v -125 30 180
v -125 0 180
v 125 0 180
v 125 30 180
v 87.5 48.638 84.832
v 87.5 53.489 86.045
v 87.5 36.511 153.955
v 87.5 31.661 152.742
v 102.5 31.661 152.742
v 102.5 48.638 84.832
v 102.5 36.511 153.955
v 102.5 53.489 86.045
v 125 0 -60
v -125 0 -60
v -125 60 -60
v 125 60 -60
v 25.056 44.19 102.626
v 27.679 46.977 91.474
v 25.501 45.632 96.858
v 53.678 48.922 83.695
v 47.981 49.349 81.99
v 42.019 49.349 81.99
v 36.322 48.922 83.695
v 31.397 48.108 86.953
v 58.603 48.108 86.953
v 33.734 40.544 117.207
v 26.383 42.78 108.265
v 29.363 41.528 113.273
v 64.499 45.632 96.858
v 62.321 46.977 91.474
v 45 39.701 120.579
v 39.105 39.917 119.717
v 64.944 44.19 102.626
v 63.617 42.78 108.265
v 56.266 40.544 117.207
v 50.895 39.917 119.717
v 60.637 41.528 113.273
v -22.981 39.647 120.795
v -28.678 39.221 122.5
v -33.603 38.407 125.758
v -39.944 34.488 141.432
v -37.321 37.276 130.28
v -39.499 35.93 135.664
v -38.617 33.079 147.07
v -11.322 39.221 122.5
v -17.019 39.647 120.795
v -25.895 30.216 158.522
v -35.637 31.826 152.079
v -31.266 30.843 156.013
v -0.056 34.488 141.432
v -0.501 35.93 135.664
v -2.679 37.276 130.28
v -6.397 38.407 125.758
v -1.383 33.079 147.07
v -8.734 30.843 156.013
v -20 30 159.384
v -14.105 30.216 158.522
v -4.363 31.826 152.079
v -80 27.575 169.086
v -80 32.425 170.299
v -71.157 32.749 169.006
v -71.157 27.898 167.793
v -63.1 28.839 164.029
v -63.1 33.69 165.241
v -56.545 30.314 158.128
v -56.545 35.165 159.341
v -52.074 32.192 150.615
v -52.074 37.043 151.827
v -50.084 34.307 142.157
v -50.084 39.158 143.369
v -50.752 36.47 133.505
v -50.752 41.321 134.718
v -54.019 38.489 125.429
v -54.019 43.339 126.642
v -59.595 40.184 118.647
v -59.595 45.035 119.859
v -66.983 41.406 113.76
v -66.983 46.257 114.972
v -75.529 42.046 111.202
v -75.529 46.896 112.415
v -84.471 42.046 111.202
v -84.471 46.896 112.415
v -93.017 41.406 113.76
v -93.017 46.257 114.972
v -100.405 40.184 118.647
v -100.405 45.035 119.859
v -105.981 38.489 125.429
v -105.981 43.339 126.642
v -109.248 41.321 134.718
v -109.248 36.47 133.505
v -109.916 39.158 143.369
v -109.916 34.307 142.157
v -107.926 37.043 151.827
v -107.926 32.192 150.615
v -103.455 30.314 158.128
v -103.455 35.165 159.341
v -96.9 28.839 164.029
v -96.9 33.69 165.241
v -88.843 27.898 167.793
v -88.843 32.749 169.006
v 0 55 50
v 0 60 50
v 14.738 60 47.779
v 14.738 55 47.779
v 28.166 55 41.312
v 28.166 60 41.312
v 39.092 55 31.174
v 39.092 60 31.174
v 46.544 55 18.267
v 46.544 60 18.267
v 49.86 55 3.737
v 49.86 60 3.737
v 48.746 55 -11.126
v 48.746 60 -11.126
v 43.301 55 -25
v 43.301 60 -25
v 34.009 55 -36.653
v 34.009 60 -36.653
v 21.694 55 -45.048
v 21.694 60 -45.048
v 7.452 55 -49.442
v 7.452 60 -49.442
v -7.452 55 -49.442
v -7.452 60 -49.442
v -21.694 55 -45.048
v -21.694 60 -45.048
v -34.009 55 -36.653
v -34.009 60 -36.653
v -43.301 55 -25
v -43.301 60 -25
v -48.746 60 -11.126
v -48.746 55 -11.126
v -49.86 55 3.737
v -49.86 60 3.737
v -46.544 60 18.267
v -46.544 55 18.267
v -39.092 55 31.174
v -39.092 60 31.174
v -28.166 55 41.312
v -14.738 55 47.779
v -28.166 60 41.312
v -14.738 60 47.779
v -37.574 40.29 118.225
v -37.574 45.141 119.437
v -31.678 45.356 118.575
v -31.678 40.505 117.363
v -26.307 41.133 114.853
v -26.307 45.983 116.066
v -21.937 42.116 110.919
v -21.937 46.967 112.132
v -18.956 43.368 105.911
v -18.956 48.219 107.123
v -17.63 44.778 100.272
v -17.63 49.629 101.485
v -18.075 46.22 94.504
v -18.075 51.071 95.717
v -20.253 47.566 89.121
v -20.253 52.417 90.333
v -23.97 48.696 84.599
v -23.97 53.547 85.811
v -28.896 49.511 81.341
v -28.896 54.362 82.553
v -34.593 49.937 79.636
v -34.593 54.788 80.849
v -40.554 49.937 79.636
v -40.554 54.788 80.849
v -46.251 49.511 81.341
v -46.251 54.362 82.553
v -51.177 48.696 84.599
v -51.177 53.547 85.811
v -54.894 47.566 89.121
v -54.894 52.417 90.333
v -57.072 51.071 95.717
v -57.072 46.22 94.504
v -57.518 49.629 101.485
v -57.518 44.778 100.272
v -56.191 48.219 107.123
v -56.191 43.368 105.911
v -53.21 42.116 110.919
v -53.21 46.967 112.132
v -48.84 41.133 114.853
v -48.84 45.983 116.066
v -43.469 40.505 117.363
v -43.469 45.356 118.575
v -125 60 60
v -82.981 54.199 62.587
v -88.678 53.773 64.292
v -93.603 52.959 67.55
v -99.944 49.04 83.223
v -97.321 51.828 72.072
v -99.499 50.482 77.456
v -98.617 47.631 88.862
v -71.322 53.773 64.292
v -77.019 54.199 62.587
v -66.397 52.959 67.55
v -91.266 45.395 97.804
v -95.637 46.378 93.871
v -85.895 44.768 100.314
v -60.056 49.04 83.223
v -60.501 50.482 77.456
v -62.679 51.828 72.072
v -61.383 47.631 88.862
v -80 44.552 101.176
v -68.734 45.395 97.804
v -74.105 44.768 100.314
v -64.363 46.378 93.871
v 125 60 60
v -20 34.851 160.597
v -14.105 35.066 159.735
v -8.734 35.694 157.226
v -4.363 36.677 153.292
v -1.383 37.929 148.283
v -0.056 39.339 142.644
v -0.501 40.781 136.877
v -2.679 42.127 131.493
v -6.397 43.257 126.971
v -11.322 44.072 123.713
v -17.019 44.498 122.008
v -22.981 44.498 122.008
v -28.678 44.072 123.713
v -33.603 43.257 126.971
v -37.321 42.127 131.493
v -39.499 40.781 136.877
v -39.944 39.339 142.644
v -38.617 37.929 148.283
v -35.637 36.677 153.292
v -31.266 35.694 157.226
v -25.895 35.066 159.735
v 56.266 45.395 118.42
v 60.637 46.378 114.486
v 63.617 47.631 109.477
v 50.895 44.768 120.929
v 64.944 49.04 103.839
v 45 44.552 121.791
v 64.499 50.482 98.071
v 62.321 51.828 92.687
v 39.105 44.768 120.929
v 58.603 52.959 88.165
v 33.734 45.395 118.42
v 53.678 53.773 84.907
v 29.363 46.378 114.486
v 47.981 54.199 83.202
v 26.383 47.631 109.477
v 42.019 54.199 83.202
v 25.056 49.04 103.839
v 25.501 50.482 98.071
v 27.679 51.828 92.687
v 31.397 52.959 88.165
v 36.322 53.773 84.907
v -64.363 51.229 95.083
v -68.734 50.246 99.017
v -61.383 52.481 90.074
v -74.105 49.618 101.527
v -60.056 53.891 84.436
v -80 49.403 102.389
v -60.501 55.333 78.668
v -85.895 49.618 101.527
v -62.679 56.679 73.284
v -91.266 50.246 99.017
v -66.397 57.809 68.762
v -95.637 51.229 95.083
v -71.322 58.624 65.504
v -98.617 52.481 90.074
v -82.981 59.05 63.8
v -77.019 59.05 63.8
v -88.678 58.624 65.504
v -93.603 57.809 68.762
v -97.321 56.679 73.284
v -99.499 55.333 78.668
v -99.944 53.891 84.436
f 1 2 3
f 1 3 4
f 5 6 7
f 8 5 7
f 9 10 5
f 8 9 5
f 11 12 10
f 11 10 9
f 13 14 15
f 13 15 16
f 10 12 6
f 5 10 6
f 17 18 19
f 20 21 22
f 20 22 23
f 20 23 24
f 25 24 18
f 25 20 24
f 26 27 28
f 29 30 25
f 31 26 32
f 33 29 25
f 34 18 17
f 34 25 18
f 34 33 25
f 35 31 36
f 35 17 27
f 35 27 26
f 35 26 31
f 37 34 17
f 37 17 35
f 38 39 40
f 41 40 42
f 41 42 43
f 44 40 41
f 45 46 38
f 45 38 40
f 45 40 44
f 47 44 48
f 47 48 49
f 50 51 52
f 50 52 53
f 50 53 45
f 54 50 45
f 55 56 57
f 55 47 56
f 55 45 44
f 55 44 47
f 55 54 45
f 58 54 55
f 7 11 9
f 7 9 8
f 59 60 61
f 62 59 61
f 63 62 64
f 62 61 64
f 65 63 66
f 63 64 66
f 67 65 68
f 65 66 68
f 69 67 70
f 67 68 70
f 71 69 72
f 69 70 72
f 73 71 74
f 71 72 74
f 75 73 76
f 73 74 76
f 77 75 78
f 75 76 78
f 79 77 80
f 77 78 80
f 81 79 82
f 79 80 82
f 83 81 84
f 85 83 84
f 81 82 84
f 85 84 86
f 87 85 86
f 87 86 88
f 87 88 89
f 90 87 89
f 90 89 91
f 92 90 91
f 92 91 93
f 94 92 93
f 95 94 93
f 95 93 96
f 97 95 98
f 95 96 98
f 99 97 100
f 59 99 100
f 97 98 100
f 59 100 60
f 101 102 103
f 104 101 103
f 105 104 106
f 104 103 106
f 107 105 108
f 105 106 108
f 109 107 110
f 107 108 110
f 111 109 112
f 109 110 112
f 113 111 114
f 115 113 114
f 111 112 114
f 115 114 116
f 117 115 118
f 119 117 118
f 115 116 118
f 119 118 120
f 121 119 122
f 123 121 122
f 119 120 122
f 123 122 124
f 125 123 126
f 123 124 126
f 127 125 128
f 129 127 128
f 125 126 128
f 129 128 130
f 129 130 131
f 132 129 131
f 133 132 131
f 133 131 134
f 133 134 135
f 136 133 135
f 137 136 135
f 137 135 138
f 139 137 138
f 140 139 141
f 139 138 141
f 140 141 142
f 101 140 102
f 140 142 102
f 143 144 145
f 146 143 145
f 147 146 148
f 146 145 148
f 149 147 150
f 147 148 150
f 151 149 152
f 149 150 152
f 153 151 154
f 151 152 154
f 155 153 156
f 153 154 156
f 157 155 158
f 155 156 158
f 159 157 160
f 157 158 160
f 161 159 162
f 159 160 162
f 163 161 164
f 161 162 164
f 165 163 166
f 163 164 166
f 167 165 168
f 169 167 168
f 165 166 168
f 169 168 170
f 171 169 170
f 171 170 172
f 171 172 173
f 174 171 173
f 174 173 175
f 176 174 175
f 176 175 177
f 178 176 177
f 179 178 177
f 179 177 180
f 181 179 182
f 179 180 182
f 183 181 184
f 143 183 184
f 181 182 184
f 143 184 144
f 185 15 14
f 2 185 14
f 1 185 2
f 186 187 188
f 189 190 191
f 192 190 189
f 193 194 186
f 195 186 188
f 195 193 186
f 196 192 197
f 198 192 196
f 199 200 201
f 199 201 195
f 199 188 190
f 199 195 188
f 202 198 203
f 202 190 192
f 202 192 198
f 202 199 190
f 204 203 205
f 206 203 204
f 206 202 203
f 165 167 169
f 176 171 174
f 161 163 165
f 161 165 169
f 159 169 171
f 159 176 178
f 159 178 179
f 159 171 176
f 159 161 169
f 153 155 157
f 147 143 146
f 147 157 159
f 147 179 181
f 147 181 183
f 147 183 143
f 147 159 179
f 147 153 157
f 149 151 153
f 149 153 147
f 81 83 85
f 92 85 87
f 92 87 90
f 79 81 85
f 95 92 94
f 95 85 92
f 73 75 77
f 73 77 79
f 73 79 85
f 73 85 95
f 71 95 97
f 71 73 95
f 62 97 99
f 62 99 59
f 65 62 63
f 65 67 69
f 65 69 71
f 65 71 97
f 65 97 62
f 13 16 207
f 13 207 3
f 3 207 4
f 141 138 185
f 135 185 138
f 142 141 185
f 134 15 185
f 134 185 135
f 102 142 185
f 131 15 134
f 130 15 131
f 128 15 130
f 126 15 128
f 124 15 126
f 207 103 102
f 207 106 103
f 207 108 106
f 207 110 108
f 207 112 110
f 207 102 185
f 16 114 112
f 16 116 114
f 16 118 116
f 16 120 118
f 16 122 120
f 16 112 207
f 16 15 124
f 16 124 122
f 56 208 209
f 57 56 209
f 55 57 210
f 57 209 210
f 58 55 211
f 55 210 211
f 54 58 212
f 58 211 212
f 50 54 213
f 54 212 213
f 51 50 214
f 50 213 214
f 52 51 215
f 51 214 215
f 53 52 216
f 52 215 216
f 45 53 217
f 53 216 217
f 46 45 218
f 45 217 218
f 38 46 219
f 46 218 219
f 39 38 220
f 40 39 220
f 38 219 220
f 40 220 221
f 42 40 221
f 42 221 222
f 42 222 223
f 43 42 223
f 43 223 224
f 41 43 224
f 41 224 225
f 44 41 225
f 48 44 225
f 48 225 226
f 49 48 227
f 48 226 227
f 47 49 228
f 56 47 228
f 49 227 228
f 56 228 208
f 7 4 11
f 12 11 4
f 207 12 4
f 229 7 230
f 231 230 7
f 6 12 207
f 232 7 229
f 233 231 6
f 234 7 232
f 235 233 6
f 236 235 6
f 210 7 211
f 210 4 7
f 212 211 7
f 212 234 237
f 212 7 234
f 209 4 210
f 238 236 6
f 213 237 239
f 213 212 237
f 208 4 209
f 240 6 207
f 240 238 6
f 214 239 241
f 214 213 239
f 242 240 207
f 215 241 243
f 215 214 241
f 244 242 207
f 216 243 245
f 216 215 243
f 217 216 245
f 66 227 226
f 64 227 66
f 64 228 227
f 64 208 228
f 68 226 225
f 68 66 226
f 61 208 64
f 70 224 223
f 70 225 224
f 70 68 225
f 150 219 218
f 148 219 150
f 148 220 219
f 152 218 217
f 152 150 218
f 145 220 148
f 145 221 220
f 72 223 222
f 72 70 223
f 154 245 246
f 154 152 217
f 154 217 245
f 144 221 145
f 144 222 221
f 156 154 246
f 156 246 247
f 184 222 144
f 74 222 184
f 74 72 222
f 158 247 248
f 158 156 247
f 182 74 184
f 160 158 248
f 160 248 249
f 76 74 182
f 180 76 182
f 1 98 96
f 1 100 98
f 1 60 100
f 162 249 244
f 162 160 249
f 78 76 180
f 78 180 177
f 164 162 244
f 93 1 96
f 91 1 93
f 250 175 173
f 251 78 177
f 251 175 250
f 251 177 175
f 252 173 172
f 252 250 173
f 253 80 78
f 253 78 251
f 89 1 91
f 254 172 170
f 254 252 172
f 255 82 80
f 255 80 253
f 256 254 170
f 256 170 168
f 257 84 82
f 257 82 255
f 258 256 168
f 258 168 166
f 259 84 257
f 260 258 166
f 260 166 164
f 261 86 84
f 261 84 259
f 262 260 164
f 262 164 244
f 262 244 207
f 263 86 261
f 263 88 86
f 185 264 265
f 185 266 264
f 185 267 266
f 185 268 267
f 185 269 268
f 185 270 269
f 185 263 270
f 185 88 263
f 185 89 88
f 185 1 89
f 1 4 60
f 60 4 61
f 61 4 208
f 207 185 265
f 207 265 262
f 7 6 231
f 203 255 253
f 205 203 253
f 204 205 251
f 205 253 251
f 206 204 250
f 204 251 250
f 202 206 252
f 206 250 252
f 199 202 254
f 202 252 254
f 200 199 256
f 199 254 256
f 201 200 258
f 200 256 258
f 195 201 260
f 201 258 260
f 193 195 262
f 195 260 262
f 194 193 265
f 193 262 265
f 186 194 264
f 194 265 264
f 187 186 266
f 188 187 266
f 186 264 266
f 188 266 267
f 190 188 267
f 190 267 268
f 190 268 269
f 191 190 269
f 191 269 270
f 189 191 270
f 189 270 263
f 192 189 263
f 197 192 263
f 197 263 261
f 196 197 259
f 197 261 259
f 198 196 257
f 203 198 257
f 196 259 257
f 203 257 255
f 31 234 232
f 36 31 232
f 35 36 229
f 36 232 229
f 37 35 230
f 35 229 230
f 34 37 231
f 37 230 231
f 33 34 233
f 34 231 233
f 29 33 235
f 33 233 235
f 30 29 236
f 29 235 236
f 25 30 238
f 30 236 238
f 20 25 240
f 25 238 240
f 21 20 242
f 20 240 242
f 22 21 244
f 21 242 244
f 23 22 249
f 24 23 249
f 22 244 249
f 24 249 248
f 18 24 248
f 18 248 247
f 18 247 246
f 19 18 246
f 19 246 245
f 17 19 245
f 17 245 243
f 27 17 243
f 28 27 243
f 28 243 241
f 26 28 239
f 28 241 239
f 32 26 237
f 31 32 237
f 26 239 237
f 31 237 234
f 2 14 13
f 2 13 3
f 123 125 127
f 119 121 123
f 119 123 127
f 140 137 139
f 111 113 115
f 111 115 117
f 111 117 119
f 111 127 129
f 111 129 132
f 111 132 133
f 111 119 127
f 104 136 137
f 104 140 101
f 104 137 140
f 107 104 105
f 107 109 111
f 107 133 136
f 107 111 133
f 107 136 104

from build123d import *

# Parameters (mm, degrees)
CROQUIS1_W              = 250
CROQUIS1_H              = 120
SALIENTE_EXTRUIR1_DEPTH = 60
SALIENTE_EXTRUIR2_DEPTH = 250
CROQUIS3_R              = 50
CORTAR_EXTRUIR1_DEPTH   = 5
CROQUIS5_R              = 30
CROQUIS5_R_2            = 20
CROQUIS5_W              = 15
CROQUIS5_H              = 70
CORTAR_EXTRUIR2_DEPTH   = 5


with BuildPart() as part:
    # Croquis1 → Saliente-Extruir1 (new body)
    with BuildSketch(Plane(origin=(0, 0, 0), x_dir=(1, 0, 0), z_dir=(0, 1, 0))):
        Rectangle(CROQUIS1_W, CROQUIS1_H)
    extrude(amount=SALIENTE_EXTRUIR1_DEPTH)

    # Croquis2 → Saliente-Extruir2 (add)
    with BuildSketch(Plane.ZY.offset(125)):
        Polygon((60, 60), (60, 0), (180, 0), (180, 30), align=None)
    extrude(amount=-SALIENTE_EXTRUIR2_DEPTH)

    # Croquis3 → Cortar-Extruir1 (cut)
    with BuildSketch(Plane(origin=(0, 60, 0), x_dir=(1, 0, 0), z_dir=(0, 1, 0))):
        with Locations(Location((0, 0, 0), (0, 0, 270))):
            Circle(CROQUIS3_R)
    extrude(amount=-CORTAR_EXTRUIR1_DEPTH, mode=Mode.SUBTRACT)

    # Croquis5 → Cortar-Extruir2 (cut)
    with BuildSketch(Plane(origin=(0, 70.588235294, 17.647058824), x_dir=(-1, 0, 0), z_dir=(0, 0.970142500145332, 0.24253562503633302))):
        with Locations(Location((80, 127.349581275, 0), (0, 0, 90))):
            Circle(CROQUIS5_R)
        with Locations(Location((80, 67.349581275, 0), (0, 0, 90))):
            Circle(CROQUIS5_R_2)
        with Locations(Location((37.573593129, 84.923174404, 0), (0, 0, 90))):
            Circle(CROQUIS5_R_2)
        with Locations(Location((20, 127.349581275, 0), (0, 0, 90))):
            Circle(CROQUIS5_R_2)
        with Locations(Location((-45, 87.349581275, 0), (0, 0, 90))):
            Circle(CROQUIS5_R_2)
        with Locations((-95, 105.502996891)):
            Rectangle(CROQUIS5_W, CROQUIS5_H)
    extrude(amount=-CORTAR_EXTRUIR2_DEPTH, mode=Mode.SUBTRACT)


solid = part.part
